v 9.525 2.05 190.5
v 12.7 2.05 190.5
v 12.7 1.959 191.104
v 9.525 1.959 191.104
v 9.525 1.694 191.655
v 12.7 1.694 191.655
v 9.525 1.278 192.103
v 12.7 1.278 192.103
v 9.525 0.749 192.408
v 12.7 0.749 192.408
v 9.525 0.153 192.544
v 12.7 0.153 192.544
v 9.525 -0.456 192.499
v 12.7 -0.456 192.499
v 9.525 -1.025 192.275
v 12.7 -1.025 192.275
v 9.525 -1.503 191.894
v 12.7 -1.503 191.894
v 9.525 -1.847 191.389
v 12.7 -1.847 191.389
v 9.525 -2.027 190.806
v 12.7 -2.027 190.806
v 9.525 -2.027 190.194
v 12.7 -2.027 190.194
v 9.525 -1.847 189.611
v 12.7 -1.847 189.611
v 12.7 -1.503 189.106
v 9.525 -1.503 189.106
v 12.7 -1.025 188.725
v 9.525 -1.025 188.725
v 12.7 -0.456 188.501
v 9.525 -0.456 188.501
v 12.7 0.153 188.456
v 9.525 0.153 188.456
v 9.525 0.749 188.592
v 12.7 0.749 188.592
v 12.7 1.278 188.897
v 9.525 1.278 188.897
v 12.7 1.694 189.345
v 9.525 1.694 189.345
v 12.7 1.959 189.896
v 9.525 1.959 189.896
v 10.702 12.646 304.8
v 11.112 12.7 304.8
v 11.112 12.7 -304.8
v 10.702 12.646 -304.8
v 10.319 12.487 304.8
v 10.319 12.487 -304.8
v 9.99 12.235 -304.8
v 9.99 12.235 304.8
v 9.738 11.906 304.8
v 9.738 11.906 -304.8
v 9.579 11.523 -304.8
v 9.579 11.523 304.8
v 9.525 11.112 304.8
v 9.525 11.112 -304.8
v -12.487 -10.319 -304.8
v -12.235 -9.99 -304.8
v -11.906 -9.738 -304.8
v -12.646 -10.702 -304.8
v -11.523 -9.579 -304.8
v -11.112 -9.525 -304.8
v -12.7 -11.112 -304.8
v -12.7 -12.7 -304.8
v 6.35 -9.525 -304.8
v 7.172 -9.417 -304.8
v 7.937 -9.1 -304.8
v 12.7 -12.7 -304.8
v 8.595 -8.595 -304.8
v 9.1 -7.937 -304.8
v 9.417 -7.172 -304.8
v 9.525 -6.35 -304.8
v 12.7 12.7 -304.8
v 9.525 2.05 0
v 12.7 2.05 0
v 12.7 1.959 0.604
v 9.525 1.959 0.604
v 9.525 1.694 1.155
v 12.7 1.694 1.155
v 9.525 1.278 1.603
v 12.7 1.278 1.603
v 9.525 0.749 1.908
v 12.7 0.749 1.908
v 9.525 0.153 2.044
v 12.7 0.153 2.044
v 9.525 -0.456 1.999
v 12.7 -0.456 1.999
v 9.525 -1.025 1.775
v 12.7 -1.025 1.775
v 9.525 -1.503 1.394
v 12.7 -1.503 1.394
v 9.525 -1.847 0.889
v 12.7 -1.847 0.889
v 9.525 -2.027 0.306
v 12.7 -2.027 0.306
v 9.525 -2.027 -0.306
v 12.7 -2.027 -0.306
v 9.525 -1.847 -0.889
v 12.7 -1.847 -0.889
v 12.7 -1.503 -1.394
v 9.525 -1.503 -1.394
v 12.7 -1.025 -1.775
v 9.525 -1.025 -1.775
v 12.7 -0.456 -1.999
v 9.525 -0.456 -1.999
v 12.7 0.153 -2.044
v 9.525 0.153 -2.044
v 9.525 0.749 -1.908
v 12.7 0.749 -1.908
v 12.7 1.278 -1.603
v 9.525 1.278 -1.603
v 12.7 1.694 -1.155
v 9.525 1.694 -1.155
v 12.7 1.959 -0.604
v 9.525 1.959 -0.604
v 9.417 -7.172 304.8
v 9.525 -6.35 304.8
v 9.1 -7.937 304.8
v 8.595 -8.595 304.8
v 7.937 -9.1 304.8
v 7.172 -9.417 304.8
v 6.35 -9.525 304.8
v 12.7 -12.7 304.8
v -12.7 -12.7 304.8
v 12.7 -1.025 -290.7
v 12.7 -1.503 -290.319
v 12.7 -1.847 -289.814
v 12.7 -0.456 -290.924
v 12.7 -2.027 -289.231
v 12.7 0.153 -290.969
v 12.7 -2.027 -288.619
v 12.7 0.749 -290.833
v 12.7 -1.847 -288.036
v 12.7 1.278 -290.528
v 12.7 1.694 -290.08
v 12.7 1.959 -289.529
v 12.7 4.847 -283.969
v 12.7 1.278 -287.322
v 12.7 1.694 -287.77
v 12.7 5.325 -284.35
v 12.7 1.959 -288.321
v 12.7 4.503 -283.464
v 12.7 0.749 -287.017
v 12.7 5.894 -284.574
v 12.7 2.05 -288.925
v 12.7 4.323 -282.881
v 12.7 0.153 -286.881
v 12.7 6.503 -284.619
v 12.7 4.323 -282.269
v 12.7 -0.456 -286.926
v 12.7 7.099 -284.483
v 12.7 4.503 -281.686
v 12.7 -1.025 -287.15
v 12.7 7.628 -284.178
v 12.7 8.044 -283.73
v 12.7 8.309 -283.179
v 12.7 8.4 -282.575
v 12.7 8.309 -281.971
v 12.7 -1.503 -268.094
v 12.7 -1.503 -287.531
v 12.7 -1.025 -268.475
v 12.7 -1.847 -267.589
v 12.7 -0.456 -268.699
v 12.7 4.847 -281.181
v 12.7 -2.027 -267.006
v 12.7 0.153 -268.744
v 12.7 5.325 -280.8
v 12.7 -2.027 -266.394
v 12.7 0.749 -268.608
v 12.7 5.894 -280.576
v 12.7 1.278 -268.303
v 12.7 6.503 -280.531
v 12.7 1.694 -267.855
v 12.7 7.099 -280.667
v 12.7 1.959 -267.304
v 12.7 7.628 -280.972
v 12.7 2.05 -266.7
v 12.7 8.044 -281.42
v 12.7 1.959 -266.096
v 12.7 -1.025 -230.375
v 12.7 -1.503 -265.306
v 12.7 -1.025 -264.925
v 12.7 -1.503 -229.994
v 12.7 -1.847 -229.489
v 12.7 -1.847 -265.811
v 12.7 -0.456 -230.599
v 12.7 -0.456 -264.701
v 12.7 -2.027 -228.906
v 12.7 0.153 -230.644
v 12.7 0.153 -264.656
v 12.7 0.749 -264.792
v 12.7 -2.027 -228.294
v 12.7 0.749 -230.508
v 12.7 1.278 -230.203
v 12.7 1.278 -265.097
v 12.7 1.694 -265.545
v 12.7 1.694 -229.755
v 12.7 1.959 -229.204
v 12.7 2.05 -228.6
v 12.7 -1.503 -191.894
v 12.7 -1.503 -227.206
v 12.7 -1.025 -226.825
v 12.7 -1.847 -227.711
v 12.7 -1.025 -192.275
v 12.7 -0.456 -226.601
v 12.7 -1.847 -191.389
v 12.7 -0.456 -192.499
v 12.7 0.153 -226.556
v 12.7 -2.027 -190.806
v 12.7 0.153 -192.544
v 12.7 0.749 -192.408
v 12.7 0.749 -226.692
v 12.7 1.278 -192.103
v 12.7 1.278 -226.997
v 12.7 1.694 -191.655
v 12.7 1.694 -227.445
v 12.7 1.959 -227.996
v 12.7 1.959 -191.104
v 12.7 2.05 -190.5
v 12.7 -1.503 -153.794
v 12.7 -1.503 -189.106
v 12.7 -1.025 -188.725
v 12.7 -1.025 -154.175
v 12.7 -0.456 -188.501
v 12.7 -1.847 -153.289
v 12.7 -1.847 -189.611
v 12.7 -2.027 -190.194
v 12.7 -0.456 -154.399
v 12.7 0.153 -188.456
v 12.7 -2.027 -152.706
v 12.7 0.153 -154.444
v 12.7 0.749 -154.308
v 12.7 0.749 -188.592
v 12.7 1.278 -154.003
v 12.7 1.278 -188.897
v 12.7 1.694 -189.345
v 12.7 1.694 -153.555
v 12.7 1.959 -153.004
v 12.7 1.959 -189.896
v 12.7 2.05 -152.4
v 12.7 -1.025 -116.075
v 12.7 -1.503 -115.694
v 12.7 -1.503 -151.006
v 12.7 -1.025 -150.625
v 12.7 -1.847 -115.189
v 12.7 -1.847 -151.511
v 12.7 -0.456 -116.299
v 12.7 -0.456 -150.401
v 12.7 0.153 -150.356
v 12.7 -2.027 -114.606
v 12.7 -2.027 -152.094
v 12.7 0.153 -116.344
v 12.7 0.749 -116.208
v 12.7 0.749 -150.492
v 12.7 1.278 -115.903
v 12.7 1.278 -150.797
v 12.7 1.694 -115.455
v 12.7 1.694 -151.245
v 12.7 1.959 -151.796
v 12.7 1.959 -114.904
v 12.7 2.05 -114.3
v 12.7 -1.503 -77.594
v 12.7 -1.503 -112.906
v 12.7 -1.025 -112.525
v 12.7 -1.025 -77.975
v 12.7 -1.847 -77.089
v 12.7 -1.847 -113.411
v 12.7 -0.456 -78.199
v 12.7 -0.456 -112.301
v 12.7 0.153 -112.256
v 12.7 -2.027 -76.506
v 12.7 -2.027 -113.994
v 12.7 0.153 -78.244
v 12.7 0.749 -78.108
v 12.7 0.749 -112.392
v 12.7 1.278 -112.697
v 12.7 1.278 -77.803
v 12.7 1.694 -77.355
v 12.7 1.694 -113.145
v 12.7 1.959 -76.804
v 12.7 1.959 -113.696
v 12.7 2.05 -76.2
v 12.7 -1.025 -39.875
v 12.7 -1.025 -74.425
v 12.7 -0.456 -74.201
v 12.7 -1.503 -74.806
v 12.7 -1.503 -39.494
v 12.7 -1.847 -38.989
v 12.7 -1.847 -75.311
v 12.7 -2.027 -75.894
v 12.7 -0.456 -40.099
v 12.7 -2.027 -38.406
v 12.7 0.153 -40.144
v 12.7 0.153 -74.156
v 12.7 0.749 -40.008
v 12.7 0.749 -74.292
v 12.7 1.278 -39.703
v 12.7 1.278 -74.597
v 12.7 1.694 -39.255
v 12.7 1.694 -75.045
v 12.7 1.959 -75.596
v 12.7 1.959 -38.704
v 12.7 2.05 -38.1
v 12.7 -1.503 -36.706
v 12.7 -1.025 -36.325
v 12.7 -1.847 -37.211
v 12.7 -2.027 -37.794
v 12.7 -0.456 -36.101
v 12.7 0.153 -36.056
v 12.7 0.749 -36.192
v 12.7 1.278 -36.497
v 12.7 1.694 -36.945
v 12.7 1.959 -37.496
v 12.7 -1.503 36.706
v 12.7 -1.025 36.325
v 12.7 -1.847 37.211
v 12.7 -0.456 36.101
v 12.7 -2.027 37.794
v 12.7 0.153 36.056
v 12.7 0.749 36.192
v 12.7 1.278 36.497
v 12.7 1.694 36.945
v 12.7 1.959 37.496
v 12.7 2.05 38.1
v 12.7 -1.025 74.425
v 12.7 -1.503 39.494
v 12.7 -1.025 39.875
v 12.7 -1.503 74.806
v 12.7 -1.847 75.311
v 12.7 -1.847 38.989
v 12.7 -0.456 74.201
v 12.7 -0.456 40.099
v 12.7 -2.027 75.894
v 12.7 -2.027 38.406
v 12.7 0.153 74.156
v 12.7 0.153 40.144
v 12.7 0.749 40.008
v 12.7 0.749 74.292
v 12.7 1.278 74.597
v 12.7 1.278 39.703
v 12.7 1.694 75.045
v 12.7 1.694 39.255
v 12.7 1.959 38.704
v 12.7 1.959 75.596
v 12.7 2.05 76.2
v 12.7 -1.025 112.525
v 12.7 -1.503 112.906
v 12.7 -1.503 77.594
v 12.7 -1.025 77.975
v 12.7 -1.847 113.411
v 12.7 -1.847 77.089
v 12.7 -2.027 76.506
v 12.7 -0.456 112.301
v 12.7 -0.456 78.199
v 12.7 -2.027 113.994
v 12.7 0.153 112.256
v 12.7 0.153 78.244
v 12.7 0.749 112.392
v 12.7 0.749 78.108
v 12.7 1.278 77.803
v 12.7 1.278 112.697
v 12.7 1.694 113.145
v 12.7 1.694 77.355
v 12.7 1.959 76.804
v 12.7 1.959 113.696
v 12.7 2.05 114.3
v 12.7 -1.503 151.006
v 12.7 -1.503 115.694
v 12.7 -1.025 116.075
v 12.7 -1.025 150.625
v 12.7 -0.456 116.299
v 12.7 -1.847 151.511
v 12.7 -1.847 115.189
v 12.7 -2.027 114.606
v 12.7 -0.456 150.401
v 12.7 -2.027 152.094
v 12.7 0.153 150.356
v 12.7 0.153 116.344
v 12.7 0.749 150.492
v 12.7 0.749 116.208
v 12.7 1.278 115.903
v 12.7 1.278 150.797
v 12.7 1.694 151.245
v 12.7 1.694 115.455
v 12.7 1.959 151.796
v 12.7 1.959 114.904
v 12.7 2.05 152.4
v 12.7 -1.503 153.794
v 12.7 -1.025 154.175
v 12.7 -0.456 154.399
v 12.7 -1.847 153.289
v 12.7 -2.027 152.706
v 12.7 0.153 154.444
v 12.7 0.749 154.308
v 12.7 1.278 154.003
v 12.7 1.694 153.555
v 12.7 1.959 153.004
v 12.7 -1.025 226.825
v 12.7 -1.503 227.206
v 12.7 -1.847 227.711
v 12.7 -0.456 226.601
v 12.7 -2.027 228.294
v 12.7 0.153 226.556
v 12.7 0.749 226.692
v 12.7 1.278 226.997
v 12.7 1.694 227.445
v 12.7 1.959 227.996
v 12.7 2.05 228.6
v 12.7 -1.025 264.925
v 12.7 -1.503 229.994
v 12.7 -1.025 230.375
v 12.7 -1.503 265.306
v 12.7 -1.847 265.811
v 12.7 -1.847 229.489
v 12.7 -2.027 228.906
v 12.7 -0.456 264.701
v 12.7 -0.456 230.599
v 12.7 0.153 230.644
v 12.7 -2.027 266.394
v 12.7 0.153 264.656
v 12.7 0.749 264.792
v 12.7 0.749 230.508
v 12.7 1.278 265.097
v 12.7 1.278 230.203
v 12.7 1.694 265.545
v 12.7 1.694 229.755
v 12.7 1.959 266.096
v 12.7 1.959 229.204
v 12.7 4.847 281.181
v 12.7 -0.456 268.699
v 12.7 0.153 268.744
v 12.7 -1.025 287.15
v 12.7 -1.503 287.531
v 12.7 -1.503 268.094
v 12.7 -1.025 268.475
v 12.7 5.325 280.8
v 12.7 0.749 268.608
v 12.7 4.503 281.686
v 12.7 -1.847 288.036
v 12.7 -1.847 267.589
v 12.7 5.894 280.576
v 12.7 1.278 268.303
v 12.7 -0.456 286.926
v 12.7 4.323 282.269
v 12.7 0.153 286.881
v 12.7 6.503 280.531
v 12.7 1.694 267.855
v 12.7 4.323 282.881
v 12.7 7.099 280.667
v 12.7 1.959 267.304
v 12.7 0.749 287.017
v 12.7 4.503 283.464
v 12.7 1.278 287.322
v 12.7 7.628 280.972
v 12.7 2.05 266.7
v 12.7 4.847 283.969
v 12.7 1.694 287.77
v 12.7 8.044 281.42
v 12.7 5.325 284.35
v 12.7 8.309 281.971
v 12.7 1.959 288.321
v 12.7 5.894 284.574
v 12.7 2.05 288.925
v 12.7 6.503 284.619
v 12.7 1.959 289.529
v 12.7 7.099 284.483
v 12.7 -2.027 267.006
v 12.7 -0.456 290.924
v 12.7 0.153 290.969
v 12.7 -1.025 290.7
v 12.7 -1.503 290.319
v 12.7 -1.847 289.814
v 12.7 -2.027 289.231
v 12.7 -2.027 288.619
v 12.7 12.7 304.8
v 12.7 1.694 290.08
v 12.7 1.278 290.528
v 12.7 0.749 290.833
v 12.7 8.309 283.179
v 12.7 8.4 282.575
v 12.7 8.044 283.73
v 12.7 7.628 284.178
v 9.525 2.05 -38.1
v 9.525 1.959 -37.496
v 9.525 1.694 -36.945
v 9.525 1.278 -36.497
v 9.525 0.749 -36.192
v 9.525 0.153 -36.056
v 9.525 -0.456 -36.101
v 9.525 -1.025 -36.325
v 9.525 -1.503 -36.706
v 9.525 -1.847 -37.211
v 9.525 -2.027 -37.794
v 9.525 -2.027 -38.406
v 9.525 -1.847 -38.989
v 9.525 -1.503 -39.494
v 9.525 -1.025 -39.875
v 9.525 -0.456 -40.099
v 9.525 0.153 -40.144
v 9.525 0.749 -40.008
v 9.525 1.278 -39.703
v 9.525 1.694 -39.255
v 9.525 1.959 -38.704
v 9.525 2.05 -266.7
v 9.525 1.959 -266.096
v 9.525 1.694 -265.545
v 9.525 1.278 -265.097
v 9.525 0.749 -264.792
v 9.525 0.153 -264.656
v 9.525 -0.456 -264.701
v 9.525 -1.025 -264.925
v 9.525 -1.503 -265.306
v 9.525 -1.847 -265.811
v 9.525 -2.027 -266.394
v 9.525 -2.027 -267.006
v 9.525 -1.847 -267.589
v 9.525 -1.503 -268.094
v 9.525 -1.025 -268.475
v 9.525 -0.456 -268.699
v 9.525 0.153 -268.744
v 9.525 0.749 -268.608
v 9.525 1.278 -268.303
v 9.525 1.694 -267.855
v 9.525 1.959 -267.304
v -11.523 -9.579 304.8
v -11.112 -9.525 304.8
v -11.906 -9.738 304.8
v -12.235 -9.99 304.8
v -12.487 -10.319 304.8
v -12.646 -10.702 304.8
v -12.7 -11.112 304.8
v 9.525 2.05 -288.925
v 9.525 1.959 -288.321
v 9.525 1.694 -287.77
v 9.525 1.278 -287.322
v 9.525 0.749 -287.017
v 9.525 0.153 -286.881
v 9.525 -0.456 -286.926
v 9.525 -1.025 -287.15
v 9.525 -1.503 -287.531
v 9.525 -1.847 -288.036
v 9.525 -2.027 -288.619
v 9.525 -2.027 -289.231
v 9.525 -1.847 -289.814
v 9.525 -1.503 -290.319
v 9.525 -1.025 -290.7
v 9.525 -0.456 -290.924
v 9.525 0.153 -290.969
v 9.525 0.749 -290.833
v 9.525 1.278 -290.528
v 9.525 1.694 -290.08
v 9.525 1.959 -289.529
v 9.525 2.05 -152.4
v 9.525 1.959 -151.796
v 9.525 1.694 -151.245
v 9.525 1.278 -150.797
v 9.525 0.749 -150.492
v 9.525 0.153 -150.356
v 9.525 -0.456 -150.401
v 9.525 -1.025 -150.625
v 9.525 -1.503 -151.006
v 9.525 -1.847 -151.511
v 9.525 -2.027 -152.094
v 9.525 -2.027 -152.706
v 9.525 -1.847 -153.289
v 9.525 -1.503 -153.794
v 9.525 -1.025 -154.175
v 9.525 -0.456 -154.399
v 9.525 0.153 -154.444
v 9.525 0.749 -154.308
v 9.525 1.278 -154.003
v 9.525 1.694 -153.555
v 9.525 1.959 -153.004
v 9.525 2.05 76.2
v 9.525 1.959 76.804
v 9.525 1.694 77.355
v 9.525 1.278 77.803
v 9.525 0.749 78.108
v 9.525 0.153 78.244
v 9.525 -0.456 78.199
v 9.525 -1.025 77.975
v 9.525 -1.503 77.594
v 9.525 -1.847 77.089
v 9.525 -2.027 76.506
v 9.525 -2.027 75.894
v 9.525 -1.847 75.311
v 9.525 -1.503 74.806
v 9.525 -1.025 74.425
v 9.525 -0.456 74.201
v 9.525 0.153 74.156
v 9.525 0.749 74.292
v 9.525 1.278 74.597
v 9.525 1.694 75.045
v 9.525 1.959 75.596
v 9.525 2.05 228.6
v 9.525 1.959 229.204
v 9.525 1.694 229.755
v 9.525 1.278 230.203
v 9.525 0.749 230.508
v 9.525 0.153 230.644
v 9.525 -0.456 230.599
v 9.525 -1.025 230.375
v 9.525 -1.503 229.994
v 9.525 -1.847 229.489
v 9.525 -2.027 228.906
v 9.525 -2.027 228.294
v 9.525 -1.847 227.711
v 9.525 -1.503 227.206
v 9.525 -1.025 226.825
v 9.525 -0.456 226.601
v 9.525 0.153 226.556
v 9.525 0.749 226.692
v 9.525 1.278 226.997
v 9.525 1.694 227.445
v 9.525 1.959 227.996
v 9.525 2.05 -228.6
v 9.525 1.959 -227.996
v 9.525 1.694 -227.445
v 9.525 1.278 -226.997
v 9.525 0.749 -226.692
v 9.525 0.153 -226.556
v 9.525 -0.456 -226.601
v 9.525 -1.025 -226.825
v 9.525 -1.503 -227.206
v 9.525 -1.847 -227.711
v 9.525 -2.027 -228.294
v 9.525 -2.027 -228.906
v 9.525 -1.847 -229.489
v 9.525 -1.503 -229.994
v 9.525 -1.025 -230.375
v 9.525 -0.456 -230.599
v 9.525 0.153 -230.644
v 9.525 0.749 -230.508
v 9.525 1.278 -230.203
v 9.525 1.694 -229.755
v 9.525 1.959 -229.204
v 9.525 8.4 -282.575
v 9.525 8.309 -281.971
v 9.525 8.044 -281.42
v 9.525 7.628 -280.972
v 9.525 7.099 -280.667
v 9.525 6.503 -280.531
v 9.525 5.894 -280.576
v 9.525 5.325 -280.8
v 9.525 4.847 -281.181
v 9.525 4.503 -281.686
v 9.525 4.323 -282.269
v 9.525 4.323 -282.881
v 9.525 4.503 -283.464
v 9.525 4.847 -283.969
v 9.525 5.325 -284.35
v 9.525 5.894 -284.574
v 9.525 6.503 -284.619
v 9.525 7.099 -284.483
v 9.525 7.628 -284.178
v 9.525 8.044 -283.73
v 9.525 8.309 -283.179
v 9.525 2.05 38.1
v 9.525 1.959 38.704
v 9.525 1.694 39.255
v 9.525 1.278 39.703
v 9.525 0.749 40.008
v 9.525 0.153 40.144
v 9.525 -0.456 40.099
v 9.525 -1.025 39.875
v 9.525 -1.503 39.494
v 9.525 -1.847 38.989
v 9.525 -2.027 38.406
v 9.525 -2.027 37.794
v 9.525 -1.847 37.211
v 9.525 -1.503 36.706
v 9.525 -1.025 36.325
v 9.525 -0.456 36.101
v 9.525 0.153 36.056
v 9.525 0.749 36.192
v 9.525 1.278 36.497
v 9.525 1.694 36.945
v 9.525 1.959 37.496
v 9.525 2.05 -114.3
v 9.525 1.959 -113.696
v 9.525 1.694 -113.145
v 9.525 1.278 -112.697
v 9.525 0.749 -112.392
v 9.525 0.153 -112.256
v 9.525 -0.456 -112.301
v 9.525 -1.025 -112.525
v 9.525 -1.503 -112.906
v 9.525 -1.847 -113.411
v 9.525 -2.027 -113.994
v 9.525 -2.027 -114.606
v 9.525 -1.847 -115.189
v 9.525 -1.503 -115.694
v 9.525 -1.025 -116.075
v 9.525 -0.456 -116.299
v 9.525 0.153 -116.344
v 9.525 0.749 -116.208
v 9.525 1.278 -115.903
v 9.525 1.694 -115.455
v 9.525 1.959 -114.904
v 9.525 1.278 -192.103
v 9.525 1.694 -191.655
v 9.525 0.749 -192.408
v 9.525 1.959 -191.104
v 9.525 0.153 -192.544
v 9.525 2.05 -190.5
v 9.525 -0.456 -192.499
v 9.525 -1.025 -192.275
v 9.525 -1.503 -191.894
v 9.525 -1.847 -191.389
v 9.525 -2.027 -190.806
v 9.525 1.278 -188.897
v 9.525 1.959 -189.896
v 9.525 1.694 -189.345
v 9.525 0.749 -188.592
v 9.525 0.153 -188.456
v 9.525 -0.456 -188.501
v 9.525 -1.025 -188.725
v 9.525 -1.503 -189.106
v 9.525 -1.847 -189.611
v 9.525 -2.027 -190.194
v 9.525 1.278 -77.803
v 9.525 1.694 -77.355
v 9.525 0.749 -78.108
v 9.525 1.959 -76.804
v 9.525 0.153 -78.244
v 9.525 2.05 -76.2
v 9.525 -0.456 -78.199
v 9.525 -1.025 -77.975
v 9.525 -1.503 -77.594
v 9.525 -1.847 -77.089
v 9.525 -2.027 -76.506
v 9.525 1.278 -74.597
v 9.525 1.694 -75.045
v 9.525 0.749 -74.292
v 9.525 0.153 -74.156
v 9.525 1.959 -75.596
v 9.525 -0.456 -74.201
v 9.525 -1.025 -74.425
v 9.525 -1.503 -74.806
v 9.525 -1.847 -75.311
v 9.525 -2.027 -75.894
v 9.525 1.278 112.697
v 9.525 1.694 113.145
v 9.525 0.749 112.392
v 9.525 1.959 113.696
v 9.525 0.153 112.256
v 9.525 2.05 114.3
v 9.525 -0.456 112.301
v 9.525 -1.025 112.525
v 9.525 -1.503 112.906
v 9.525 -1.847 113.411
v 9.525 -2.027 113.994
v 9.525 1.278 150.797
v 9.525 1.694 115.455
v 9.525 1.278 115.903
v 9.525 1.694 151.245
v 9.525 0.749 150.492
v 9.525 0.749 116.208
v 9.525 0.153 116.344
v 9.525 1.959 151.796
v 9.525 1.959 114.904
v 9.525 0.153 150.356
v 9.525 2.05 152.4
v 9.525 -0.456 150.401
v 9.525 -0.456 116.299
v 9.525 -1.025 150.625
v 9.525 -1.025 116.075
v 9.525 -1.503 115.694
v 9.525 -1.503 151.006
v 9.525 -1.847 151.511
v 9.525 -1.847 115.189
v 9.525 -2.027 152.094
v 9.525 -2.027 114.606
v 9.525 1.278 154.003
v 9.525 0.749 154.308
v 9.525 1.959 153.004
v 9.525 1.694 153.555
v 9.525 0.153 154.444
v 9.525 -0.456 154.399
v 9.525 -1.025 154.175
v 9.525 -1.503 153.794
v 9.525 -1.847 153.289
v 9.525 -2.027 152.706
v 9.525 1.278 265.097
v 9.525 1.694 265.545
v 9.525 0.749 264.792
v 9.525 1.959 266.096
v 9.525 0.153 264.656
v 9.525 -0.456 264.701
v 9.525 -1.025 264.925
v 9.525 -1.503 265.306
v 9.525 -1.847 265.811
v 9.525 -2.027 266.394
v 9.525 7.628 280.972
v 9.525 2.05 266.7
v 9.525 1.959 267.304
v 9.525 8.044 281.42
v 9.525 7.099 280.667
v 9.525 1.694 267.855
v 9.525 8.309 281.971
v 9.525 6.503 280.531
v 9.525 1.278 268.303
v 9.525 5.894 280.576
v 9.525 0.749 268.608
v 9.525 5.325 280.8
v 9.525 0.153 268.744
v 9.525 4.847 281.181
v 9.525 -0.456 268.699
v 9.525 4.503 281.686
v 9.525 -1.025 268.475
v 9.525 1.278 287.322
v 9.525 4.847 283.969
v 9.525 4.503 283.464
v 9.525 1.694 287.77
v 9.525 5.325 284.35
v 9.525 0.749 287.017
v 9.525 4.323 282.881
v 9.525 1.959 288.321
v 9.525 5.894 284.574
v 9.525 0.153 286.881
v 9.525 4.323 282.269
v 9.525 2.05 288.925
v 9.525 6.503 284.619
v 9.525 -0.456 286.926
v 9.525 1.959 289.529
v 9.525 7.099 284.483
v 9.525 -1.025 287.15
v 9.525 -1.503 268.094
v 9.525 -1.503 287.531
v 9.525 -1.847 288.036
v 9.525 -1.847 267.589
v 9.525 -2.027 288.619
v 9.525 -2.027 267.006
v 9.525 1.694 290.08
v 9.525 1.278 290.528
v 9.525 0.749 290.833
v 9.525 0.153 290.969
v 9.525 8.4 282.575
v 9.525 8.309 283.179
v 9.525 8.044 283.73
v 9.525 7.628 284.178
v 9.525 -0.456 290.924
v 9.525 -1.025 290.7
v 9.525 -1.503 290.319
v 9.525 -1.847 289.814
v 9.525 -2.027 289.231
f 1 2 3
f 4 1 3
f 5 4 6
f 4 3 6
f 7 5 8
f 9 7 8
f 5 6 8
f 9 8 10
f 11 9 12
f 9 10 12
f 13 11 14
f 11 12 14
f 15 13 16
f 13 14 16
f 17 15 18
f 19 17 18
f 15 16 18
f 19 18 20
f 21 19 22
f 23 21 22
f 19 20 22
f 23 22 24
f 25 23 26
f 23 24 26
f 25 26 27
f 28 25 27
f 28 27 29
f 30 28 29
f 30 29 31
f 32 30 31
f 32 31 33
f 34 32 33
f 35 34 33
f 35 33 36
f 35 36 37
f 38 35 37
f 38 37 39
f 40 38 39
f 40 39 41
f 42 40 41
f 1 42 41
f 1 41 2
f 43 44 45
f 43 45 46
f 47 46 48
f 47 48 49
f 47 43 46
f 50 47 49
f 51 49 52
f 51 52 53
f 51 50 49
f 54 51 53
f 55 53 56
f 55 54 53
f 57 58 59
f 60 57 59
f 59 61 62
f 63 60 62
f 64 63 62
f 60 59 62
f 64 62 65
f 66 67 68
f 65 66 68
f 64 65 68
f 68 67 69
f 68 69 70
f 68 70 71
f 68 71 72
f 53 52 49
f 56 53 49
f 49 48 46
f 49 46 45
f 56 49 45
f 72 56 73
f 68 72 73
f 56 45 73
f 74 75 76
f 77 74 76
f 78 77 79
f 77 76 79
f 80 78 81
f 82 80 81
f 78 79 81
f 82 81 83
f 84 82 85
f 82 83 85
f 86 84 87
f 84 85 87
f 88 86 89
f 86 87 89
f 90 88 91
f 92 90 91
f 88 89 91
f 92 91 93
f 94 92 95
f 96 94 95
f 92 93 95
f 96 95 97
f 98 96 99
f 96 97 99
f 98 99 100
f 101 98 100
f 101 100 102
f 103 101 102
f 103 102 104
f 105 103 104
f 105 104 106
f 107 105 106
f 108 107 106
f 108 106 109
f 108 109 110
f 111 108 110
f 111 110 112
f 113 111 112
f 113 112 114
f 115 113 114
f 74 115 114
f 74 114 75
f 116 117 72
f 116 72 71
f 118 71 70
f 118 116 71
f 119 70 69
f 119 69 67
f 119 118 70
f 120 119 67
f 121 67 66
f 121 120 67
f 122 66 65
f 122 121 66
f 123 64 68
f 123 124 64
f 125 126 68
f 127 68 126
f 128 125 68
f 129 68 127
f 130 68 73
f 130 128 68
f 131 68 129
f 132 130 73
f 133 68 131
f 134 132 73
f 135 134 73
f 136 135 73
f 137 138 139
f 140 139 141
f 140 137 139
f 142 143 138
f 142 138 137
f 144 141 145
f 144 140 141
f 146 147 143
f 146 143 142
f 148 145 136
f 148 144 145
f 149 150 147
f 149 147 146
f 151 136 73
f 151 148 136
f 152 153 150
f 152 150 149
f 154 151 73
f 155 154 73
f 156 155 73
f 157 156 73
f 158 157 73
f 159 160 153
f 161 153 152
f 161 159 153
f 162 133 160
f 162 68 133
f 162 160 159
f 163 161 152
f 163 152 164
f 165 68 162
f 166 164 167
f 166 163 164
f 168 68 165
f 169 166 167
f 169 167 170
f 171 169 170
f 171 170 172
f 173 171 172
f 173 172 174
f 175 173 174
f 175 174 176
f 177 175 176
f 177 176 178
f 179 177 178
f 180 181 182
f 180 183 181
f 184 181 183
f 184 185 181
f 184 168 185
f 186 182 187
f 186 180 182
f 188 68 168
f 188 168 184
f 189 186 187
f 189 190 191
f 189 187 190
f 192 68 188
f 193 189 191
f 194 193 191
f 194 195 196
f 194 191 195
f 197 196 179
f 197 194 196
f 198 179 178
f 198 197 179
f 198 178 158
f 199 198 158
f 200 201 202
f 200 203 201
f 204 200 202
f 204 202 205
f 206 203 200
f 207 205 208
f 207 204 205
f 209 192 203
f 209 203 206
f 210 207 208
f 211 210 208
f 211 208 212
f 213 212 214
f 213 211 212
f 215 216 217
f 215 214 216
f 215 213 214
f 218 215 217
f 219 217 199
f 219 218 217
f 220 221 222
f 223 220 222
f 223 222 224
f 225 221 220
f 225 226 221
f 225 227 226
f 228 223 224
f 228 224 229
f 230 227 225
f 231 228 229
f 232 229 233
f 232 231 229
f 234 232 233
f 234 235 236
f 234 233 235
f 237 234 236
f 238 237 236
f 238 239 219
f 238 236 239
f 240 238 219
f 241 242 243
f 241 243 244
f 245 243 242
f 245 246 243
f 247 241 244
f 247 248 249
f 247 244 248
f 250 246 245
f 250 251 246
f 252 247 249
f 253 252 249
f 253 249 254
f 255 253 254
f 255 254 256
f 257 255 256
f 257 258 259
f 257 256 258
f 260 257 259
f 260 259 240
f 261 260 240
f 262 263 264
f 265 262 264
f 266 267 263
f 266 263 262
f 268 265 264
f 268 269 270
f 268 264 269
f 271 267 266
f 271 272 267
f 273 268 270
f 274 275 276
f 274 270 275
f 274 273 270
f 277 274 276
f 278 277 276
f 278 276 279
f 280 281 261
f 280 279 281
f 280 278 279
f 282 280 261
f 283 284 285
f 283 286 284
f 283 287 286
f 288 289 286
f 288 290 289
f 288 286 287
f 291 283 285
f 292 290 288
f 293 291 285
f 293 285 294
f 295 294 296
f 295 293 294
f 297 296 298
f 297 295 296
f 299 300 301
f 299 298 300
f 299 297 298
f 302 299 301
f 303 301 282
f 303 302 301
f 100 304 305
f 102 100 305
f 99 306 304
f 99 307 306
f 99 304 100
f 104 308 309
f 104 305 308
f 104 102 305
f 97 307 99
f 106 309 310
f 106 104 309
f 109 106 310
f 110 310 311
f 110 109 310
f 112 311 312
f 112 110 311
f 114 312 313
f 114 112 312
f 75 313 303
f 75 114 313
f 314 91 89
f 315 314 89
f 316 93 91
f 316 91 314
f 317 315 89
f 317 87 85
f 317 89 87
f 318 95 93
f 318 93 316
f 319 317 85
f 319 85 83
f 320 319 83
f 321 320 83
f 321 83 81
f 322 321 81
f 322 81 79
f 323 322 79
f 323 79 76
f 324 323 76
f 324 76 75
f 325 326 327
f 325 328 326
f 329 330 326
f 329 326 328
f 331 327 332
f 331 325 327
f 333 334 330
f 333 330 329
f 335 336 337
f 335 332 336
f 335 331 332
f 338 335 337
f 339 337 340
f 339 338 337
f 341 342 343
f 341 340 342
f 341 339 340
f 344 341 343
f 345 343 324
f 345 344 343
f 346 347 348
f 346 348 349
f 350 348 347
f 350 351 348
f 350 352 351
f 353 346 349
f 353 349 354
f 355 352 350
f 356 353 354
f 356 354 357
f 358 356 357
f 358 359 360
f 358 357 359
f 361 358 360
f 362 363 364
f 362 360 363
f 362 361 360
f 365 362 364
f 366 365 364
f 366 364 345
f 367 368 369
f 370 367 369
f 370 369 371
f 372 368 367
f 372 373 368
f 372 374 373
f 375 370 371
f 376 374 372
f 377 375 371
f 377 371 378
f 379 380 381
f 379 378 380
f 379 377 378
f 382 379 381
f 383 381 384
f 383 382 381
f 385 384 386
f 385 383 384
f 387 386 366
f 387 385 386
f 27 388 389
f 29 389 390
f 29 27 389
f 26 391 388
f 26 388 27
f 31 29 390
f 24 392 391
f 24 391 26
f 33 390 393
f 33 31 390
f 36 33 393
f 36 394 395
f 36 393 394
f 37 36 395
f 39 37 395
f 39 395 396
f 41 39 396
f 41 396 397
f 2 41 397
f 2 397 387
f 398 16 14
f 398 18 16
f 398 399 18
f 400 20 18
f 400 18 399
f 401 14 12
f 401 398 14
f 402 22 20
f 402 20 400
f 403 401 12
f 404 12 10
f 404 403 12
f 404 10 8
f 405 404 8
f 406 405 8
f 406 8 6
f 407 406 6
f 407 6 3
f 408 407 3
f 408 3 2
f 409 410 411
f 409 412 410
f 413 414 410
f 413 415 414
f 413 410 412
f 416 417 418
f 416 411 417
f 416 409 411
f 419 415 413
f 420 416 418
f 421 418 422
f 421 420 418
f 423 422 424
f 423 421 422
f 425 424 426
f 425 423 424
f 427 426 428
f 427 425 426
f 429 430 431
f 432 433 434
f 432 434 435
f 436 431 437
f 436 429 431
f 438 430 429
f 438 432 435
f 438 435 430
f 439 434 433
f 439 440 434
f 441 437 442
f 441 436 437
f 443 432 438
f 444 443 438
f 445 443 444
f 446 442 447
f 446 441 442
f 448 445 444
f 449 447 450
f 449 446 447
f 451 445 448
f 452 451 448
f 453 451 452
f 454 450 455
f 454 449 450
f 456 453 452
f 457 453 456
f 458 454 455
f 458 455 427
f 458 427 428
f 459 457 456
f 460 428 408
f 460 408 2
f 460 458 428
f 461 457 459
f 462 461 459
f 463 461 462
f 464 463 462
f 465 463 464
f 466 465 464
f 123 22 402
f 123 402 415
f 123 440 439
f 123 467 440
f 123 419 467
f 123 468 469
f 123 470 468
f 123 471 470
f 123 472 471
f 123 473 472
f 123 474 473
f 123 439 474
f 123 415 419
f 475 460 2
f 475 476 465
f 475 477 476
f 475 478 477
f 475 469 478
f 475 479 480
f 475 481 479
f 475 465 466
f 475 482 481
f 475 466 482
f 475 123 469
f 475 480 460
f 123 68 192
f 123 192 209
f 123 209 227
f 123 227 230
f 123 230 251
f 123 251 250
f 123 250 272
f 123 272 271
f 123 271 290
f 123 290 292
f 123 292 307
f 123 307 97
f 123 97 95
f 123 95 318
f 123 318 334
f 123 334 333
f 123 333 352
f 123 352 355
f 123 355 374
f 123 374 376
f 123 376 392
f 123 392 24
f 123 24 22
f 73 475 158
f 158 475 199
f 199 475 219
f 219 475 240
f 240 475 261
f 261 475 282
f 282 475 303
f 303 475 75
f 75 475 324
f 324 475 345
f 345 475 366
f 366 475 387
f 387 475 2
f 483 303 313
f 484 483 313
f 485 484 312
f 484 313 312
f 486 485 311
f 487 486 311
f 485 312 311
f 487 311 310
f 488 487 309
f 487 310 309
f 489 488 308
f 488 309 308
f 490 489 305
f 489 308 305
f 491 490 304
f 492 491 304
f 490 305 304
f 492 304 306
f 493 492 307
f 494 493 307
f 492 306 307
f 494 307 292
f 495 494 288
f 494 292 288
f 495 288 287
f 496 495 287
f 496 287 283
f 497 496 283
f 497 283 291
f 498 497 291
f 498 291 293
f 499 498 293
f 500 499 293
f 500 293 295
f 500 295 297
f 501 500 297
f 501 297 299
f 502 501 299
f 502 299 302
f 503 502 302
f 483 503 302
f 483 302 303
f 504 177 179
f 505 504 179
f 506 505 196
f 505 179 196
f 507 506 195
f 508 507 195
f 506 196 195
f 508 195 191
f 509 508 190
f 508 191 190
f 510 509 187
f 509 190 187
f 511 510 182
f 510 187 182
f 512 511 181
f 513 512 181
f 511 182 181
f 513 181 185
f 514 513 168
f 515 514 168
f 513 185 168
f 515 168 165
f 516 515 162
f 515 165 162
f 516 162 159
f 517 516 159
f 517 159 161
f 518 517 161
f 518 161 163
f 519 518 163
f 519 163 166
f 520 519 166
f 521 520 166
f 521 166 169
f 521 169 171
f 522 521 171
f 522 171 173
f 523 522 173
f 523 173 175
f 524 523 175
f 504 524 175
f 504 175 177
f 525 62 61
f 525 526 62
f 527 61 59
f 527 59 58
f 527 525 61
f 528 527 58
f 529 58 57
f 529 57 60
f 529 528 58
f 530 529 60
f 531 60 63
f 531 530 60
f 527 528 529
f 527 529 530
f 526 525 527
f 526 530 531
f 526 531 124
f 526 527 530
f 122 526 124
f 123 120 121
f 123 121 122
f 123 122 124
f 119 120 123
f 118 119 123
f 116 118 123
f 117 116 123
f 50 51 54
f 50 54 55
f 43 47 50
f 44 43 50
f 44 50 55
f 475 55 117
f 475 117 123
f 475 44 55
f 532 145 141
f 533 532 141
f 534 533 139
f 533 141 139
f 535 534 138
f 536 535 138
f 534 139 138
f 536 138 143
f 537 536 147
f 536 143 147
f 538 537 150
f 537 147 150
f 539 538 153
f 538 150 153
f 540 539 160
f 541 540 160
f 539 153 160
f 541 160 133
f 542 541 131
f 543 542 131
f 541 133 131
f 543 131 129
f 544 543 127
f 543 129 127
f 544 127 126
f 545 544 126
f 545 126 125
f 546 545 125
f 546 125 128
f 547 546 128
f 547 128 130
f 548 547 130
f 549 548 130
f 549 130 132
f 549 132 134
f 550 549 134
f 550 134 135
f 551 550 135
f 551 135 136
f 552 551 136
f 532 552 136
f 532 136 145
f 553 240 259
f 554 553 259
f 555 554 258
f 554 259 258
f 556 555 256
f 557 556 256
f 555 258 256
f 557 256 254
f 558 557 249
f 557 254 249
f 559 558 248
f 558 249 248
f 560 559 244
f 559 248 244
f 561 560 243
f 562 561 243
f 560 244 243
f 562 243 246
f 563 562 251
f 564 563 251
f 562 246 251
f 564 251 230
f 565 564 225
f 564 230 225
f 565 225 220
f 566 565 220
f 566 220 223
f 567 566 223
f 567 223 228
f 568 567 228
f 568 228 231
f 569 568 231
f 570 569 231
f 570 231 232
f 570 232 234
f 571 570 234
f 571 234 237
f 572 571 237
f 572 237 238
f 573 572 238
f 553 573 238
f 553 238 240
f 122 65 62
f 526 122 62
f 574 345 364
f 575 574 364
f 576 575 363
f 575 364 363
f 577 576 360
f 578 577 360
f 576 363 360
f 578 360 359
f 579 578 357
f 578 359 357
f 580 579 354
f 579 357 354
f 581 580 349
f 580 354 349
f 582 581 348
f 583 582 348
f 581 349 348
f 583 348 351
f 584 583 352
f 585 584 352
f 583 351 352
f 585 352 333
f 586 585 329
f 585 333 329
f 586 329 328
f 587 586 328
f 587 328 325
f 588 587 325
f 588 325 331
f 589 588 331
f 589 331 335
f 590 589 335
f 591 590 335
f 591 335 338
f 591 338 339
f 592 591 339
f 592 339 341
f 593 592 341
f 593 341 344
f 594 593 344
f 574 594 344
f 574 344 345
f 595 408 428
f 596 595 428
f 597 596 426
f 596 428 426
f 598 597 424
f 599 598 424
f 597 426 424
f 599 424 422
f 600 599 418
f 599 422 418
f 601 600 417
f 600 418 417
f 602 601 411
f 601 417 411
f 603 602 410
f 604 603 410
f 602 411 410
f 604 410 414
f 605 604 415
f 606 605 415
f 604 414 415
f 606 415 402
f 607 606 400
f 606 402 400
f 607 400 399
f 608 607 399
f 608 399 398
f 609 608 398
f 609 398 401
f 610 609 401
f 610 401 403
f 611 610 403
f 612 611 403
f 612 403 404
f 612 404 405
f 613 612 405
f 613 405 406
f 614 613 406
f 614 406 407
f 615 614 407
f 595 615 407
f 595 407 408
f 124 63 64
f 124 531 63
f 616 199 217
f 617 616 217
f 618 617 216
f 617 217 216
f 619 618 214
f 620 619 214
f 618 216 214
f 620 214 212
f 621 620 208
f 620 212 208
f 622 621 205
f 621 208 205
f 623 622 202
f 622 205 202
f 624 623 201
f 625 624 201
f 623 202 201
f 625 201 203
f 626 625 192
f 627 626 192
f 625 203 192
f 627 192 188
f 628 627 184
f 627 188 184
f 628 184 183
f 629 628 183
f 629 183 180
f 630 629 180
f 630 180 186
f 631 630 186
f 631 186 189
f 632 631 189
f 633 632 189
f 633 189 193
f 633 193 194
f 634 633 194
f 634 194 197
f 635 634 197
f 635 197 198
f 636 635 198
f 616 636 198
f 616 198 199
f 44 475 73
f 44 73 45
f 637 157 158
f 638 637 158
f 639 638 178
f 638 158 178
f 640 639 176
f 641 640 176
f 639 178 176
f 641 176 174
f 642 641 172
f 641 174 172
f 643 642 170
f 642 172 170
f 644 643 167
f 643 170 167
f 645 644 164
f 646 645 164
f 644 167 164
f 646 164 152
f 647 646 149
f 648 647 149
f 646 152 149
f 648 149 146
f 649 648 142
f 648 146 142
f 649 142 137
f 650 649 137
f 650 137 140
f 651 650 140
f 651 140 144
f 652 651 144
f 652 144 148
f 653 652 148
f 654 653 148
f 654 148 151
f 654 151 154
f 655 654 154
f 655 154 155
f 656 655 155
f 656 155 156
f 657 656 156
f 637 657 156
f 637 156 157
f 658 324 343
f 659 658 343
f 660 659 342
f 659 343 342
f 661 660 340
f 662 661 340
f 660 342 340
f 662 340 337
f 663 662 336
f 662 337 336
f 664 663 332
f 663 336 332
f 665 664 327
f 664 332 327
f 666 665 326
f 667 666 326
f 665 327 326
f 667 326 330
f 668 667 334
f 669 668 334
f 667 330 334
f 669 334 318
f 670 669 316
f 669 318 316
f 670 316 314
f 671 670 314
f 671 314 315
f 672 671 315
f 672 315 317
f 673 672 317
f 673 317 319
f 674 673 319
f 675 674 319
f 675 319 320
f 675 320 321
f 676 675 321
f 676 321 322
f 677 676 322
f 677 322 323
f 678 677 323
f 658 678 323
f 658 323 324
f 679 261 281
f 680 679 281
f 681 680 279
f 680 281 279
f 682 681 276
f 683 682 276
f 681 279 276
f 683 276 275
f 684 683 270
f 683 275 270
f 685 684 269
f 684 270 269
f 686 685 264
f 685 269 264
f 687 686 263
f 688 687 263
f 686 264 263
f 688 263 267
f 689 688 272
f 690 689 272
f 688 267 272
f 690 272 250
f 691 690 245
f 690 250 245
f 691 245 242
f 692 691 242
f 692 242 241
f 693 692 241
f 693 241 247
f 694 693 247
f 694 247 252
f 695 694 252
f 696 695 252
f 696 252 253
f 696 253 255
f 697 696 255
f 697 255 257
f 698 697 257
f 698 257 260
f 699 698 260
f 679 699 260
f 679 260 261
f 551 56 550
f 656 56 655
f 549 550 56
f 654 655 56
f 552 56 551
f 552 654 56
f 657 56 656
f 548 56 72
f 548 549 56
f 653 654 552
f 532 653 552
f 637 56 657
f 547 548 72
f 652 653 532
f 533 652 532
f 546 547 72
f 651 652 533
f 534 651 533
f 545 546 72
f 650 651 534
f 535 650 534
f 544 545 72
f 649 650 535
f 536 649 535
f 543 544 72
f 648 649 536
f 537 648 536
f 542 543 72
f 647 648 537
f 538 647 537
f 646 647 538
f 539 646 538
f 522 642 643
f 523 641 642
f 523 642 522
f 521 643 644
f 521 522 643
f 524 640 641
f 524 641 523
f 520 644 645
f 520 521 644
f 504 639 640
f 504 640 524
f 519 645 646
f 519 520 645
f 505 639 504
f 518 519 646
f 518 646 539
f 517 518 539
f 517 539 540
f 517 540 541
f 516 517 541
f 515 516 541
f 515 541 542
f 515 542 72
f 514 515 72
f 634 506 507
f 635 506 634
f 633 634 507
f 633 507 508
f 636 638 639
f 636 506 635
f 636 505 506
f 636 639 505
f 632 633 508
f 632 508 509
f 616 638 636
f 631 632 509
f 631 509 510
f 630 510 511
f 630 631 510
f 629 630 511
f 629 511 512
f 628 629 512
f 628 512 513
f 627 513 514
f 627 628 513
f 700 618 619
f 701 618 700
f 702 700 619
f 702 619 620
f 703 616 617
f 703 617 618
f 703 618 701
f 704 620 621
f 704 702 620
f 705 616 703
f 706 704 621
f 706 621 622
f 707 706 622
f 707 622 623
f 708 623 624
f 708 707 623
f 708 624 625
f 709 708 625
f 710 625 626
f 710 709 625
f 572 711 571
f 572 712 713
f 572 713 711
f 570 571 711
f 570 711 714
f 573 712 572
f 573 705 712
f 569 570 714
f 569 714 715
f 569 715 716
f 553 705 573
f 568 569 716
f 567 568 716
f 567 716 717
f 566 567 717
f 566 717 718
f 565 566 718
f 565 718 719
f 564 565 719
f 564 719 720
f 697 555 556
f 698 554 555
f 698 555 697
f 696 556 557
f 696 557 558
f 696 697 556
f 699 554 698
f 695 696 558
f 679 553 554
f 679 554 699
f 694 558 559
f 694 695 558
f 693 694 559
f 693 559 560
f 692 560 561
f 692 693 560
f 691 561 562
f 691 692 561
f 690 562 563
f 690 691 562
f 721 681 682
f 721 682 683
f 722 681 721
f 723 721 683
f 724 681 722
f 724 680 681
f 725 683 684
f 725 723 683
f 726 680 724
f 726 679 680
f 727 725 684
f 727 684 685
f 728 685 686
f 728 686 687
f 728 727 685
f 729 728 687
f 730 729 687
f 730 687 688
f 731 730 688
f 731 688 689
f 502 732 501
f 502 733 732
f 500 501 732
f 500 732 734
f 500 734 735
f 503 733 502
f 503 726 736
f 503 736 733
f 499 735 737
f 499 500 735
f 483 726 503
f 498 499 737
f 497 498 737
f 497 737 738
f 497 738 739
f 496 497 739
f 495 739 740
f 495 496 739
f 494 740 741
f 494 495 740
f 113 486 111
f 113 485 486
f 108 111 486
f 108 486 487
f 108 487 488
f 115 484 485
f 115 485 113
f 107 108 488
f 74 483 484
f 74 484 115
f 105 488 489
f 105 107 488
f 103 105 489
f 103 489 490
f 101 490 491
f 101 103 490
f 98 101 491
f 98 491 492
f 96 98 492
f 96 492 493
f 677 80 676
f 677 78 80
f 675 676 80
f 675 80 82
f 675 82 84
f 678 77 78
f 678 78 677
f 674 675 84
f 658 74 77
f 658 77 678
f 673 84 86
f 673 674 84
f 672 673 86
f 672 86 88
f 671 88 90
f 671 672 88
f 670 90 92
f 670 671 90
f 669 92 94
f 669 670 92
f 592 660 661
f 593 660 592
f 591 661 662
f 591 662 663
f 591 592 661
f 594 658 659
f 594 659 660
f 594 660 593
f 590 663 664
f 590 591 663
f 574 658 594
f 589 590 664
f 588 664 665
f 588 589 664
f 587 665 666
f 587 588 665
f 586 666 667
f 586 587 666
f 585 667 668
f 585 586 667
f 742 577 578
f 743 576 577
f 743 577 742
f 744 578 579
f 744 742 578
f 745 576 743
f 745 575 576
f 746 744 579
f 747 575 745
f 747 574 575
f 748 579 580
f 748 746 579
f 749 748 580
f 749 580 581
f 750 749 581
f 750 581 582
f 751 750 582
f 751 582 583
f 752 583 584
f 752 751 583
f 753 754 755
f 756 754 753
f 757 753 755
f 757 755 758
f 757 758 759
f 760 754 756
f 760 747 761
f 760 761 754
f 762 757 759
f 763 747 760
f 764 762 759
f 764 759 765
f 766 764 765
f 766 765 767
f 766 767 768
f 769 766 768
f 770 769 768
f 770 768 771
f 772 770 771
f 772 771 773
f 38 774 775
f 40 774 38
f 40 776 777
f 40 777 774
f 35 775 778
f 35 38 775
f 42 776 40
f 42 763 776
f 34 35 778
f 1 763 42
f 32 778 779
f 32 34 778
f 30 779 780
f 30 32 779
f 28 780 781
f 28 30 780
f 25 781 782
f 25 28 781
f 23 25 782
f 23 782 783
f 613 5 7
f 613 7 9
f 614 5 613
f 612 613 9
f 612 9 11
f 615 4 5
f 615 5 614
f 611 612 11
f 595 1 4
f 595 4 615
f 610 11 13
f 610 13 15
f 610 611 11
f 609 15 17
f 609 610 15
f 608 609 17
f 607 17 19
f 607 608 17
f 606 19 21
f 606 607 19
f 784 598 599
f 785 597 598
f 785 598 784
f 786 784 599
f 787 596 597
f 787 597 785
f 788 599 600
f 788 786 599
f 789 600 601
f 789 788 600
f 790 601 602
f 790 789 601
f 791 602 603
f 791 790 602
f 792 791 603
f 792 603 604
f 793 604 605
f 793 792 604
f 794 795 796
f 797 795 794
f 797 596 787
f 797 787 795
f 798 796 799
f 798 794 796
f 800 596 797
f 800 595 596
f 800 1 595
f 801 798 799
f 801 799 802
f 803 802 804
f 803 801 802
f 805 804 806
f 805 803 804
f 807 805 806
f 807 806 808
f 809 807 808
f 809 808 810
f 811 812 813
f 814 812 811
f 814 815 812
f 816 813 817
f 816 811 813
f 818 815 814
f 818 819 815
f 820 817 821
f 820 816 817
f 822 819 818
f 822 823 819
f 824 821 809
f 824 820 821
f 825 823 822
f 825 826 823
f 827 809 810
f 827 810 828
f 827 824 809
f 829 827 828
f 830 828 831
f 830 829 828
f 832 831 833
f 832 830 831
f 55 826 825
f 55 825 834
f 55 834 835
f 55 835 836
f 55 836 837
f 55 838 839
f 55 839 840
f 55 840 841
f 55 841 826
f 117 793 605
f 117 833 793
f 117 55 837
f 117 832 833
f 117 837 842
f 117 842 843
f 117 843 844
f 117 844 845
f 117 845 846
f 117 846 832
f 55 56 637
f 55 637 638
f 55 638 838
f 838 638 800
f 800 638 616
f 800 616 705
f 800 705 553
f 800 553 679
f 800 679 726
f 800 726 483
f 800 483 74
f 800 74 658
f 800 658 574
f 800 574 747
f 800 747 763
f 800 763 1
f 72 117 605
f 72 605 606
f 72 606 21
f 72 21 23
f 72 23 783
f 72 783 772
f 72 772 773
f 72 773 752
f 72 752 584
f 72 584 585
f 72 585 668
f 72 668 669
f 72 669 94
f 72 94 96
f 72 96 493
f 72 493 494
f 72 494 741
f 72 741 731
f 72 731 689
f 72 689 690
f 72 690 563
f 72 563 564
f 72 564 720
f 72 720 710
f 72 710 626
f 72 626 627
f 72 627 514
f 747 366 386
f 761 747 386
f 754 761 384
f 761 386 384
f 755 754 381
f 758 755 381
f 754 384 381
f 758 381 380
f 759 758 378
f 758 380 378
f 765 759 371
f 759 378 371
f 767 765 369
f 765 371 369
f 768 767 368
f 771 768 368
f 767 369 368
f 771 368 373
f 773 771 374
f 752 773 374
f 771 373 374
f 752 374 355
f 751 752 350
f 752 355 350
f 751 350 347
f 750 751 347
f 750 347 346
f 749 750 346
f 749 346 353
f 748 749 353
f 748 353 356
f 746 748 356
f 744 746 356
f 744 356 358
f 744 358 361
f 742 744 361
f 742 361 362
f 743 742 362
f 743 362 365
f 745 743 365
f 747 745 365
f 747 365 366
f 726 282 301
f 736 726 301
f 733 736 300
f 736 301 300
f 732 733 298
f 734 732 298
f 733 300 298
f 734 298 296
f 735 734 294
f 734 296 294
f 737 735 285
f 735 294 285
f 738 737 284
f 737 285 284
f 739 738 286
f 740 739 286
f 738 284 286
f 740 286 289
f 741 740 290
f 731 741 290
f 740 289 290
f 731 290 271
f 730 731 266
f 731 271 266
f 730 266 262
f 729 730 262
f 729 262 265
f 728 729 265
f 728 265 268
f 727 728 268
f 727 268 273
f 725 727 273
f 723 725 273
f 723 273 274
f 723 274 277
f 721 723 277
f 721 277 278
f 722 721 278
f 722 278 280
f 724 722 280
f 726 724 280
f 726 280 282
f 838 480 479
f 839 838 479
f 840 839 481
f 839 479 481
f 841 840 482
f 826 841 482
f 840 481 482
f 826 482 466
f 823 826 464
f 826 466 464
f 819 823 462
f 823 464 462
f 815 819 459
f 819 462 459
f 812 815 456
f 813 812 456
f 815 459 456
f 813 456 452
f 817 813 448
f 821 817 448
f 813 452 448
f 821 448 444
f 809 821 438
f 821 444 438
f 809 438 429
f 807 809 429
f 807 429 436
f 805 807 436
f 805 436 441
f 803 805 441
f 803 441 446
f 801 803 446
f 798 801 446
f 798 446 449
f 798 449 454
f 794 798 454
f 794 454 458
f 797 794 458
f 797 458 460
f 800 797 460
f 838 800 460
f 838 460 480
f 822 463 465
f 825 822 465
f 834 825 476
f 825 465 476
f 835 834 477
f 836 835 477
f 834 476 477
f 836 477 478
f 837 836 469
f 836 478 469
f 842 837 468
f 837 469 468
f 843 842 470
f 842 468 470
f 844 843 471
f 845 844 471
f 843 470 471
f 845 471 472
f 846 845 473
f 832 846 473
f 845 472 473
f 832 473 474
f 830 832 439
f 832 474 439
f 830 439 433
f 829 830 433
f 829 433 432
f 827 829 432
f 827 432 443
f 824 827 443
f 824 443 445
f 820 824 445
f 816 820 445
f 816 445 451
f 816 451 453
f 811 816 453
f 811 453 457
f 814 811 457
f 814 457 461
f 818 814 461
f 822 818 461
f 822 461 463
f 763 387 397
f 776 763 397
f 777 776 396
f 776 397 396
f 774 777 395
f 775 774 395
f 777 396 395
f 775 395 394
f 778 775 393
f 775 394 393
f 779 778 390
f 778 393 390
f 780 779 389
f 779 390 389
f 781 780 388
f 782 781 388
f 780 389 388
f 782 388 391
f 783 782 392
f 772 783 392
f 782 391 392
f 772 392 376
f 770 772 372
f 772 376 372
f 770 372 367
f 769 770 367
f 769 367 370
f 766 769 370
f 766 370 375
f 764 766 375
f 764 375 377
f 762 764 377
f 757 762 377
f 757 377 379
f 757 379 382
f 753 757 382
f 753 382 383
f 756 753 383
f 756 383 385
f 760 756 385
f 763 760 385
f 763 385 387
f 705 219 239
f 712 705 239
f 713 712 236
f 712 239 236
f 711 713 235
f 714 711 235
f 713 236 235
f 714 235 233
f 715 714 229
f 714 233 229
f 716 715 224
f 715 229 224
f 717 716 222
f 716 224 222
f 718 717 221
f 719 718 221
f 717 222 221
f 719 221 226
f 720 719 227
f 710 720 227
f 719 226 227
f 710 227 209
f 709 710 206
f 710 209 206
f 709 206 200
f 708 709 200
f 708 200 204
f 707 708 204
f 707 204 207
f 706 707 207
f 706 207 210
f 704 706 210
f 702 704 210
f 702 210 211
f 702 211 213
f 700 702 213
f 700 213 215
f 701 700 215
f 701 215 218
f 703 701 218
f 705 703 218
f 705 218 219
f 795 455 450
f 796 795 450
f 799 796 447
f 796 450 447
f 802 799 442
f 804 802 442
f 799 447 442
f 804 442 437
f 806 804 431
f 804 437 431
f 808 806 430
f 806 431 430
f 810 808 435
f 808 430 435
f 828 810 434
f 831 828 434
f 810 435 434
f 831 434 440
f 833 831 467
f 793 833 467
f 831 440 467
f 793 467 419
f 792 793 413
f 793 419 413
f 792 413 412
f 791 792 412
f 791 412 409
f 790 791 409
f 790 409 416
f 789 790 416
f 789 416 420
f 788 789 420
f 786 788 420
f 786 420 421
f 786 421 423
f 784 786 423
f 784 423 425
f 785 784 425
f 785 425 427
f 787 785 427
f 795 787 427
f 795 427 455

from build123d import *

# Parameters (mm, degrees)
BOSS_EXTRUDE1_DEPTH = 304.8
SKETCH11_R          = 2.05
CUT_EXTRUDE1_DEPTH  = 50.8


with BuildPart() as part:
    # Sketch2 → Boss-Extrude1 (new, symmetric)
    with BuildSketch(Plane.XY):
        with BuildLine():
            Line((-12.7, -12.7), (12.7, -12.7))
            Line((12.7, -12.7), (12.7, 12.7))
            Line((12.7, 12.7), (11.1125, 12.7))
            ThreePointArc((11.1125, 12.7), (9.989967985, 12.235032015), (9.525, 11.1125))
            Line((9.525, 11.1125), (9.525, -6.35))
            ThreePointArc((9.525, -6.35), (8.59506403, -8.59506403), (6.35, -9.525))
            Line((6.35, -9.525), (-11.1125, -9.525))
            ThreePointArc((-11.1125, -9.525), (-12.235032015, -9.989967985), (-12.7, -11.1125))
            Line((-12.7, -11.1125), (-12.7, -12.7))
        make_face()
    extrude(amount=BOSS_EXTRUDE1_DEPTH, both=True)

    # Sketch11 → Cut-Extrude1 (cut)
    with BuildSketch(Plane(origin=(12.7, 0, 0), x_dir=(0, 0, -1), z_dir=(1, 0, 0))):
        with Locations(Location((288.925, 0, 0), (0, 0, 90))):
            Circle(SKETCH11_R)
        with Locations(Location((282.575, 6.35, 0), (0, 0, 90))):
            Circle(SKETCH11_R)
        with Locations(Location((266.7, 0, 0), (0, 0, 90))):
            Circle(SKETCH11_R)
        with Locations(Location((228.6, 0, 0), (0, 0, 90))):
            Circle(SKETCH11_R)
        with Locations(Location((190.5, 0, 0), (0, 0, 90))):
            Circle(SKETCH11_R)
        with Locations(Location((152.4, 0, 0), (0, 0, 90))):
            Circle(SKETCH11_R)
        with Locations(Location((114.3, 0, 0), (0, 0, 90))):
            Circle(SKETCH11_R)
        with Locations(Location((76.2, 0, 0), (0, 0, 90))):
            Circle(SKETCH11_R)
        with Locations(Location((38.1, 0, 0), (0, 0, 90))):
            Circle(SKETCH11_R)
        with Locations(Location((0, 0, 0), (0, 0, 90))):
            Circle(SKETCH11_R)
        with Locations(Location((-38.1, 0, 0), (0, 0, 90))):
            Circle(SKETCH11_R)
        with Locations(Location((-76.2, 0, 0), (0, 0, 90))):
            Circle(SKETCH11_R)
        with Locations(Location((-114.3, 0, 0), (0, 0, 90))):
            Circle(SKETCH11_R)
        with Locations(Location((-152.4, 0, 0), (0, 0, 90))):
            Circle(SKETCH11_R)
        with Locations(Location((-190.5, 0, 0), (0, 0, 90))):
            Circle(SKETCH11_R)
        with Locations(Location((-228.6, 0, 0), (0, 0, 90))):
            Circle(SKETCH11_R)
        with Locations(Location((-266.7, 0, 0), (0, 0, 90))):
            Circle(SKETCH11_R)
        with Locations(Location((-282.575, 6.35, 0), (0, 0, 90))):
            Circle(SKETCH11_R)
        with Locations(Location((-288.925, 0, 0), (0, 0, 90))):
            Circle(SKETCH11_R)
    extrude(amount=-CUT_EXTRUDE1_DEPTH, mode=Mode.SUBTRACT)


solid = part.part
